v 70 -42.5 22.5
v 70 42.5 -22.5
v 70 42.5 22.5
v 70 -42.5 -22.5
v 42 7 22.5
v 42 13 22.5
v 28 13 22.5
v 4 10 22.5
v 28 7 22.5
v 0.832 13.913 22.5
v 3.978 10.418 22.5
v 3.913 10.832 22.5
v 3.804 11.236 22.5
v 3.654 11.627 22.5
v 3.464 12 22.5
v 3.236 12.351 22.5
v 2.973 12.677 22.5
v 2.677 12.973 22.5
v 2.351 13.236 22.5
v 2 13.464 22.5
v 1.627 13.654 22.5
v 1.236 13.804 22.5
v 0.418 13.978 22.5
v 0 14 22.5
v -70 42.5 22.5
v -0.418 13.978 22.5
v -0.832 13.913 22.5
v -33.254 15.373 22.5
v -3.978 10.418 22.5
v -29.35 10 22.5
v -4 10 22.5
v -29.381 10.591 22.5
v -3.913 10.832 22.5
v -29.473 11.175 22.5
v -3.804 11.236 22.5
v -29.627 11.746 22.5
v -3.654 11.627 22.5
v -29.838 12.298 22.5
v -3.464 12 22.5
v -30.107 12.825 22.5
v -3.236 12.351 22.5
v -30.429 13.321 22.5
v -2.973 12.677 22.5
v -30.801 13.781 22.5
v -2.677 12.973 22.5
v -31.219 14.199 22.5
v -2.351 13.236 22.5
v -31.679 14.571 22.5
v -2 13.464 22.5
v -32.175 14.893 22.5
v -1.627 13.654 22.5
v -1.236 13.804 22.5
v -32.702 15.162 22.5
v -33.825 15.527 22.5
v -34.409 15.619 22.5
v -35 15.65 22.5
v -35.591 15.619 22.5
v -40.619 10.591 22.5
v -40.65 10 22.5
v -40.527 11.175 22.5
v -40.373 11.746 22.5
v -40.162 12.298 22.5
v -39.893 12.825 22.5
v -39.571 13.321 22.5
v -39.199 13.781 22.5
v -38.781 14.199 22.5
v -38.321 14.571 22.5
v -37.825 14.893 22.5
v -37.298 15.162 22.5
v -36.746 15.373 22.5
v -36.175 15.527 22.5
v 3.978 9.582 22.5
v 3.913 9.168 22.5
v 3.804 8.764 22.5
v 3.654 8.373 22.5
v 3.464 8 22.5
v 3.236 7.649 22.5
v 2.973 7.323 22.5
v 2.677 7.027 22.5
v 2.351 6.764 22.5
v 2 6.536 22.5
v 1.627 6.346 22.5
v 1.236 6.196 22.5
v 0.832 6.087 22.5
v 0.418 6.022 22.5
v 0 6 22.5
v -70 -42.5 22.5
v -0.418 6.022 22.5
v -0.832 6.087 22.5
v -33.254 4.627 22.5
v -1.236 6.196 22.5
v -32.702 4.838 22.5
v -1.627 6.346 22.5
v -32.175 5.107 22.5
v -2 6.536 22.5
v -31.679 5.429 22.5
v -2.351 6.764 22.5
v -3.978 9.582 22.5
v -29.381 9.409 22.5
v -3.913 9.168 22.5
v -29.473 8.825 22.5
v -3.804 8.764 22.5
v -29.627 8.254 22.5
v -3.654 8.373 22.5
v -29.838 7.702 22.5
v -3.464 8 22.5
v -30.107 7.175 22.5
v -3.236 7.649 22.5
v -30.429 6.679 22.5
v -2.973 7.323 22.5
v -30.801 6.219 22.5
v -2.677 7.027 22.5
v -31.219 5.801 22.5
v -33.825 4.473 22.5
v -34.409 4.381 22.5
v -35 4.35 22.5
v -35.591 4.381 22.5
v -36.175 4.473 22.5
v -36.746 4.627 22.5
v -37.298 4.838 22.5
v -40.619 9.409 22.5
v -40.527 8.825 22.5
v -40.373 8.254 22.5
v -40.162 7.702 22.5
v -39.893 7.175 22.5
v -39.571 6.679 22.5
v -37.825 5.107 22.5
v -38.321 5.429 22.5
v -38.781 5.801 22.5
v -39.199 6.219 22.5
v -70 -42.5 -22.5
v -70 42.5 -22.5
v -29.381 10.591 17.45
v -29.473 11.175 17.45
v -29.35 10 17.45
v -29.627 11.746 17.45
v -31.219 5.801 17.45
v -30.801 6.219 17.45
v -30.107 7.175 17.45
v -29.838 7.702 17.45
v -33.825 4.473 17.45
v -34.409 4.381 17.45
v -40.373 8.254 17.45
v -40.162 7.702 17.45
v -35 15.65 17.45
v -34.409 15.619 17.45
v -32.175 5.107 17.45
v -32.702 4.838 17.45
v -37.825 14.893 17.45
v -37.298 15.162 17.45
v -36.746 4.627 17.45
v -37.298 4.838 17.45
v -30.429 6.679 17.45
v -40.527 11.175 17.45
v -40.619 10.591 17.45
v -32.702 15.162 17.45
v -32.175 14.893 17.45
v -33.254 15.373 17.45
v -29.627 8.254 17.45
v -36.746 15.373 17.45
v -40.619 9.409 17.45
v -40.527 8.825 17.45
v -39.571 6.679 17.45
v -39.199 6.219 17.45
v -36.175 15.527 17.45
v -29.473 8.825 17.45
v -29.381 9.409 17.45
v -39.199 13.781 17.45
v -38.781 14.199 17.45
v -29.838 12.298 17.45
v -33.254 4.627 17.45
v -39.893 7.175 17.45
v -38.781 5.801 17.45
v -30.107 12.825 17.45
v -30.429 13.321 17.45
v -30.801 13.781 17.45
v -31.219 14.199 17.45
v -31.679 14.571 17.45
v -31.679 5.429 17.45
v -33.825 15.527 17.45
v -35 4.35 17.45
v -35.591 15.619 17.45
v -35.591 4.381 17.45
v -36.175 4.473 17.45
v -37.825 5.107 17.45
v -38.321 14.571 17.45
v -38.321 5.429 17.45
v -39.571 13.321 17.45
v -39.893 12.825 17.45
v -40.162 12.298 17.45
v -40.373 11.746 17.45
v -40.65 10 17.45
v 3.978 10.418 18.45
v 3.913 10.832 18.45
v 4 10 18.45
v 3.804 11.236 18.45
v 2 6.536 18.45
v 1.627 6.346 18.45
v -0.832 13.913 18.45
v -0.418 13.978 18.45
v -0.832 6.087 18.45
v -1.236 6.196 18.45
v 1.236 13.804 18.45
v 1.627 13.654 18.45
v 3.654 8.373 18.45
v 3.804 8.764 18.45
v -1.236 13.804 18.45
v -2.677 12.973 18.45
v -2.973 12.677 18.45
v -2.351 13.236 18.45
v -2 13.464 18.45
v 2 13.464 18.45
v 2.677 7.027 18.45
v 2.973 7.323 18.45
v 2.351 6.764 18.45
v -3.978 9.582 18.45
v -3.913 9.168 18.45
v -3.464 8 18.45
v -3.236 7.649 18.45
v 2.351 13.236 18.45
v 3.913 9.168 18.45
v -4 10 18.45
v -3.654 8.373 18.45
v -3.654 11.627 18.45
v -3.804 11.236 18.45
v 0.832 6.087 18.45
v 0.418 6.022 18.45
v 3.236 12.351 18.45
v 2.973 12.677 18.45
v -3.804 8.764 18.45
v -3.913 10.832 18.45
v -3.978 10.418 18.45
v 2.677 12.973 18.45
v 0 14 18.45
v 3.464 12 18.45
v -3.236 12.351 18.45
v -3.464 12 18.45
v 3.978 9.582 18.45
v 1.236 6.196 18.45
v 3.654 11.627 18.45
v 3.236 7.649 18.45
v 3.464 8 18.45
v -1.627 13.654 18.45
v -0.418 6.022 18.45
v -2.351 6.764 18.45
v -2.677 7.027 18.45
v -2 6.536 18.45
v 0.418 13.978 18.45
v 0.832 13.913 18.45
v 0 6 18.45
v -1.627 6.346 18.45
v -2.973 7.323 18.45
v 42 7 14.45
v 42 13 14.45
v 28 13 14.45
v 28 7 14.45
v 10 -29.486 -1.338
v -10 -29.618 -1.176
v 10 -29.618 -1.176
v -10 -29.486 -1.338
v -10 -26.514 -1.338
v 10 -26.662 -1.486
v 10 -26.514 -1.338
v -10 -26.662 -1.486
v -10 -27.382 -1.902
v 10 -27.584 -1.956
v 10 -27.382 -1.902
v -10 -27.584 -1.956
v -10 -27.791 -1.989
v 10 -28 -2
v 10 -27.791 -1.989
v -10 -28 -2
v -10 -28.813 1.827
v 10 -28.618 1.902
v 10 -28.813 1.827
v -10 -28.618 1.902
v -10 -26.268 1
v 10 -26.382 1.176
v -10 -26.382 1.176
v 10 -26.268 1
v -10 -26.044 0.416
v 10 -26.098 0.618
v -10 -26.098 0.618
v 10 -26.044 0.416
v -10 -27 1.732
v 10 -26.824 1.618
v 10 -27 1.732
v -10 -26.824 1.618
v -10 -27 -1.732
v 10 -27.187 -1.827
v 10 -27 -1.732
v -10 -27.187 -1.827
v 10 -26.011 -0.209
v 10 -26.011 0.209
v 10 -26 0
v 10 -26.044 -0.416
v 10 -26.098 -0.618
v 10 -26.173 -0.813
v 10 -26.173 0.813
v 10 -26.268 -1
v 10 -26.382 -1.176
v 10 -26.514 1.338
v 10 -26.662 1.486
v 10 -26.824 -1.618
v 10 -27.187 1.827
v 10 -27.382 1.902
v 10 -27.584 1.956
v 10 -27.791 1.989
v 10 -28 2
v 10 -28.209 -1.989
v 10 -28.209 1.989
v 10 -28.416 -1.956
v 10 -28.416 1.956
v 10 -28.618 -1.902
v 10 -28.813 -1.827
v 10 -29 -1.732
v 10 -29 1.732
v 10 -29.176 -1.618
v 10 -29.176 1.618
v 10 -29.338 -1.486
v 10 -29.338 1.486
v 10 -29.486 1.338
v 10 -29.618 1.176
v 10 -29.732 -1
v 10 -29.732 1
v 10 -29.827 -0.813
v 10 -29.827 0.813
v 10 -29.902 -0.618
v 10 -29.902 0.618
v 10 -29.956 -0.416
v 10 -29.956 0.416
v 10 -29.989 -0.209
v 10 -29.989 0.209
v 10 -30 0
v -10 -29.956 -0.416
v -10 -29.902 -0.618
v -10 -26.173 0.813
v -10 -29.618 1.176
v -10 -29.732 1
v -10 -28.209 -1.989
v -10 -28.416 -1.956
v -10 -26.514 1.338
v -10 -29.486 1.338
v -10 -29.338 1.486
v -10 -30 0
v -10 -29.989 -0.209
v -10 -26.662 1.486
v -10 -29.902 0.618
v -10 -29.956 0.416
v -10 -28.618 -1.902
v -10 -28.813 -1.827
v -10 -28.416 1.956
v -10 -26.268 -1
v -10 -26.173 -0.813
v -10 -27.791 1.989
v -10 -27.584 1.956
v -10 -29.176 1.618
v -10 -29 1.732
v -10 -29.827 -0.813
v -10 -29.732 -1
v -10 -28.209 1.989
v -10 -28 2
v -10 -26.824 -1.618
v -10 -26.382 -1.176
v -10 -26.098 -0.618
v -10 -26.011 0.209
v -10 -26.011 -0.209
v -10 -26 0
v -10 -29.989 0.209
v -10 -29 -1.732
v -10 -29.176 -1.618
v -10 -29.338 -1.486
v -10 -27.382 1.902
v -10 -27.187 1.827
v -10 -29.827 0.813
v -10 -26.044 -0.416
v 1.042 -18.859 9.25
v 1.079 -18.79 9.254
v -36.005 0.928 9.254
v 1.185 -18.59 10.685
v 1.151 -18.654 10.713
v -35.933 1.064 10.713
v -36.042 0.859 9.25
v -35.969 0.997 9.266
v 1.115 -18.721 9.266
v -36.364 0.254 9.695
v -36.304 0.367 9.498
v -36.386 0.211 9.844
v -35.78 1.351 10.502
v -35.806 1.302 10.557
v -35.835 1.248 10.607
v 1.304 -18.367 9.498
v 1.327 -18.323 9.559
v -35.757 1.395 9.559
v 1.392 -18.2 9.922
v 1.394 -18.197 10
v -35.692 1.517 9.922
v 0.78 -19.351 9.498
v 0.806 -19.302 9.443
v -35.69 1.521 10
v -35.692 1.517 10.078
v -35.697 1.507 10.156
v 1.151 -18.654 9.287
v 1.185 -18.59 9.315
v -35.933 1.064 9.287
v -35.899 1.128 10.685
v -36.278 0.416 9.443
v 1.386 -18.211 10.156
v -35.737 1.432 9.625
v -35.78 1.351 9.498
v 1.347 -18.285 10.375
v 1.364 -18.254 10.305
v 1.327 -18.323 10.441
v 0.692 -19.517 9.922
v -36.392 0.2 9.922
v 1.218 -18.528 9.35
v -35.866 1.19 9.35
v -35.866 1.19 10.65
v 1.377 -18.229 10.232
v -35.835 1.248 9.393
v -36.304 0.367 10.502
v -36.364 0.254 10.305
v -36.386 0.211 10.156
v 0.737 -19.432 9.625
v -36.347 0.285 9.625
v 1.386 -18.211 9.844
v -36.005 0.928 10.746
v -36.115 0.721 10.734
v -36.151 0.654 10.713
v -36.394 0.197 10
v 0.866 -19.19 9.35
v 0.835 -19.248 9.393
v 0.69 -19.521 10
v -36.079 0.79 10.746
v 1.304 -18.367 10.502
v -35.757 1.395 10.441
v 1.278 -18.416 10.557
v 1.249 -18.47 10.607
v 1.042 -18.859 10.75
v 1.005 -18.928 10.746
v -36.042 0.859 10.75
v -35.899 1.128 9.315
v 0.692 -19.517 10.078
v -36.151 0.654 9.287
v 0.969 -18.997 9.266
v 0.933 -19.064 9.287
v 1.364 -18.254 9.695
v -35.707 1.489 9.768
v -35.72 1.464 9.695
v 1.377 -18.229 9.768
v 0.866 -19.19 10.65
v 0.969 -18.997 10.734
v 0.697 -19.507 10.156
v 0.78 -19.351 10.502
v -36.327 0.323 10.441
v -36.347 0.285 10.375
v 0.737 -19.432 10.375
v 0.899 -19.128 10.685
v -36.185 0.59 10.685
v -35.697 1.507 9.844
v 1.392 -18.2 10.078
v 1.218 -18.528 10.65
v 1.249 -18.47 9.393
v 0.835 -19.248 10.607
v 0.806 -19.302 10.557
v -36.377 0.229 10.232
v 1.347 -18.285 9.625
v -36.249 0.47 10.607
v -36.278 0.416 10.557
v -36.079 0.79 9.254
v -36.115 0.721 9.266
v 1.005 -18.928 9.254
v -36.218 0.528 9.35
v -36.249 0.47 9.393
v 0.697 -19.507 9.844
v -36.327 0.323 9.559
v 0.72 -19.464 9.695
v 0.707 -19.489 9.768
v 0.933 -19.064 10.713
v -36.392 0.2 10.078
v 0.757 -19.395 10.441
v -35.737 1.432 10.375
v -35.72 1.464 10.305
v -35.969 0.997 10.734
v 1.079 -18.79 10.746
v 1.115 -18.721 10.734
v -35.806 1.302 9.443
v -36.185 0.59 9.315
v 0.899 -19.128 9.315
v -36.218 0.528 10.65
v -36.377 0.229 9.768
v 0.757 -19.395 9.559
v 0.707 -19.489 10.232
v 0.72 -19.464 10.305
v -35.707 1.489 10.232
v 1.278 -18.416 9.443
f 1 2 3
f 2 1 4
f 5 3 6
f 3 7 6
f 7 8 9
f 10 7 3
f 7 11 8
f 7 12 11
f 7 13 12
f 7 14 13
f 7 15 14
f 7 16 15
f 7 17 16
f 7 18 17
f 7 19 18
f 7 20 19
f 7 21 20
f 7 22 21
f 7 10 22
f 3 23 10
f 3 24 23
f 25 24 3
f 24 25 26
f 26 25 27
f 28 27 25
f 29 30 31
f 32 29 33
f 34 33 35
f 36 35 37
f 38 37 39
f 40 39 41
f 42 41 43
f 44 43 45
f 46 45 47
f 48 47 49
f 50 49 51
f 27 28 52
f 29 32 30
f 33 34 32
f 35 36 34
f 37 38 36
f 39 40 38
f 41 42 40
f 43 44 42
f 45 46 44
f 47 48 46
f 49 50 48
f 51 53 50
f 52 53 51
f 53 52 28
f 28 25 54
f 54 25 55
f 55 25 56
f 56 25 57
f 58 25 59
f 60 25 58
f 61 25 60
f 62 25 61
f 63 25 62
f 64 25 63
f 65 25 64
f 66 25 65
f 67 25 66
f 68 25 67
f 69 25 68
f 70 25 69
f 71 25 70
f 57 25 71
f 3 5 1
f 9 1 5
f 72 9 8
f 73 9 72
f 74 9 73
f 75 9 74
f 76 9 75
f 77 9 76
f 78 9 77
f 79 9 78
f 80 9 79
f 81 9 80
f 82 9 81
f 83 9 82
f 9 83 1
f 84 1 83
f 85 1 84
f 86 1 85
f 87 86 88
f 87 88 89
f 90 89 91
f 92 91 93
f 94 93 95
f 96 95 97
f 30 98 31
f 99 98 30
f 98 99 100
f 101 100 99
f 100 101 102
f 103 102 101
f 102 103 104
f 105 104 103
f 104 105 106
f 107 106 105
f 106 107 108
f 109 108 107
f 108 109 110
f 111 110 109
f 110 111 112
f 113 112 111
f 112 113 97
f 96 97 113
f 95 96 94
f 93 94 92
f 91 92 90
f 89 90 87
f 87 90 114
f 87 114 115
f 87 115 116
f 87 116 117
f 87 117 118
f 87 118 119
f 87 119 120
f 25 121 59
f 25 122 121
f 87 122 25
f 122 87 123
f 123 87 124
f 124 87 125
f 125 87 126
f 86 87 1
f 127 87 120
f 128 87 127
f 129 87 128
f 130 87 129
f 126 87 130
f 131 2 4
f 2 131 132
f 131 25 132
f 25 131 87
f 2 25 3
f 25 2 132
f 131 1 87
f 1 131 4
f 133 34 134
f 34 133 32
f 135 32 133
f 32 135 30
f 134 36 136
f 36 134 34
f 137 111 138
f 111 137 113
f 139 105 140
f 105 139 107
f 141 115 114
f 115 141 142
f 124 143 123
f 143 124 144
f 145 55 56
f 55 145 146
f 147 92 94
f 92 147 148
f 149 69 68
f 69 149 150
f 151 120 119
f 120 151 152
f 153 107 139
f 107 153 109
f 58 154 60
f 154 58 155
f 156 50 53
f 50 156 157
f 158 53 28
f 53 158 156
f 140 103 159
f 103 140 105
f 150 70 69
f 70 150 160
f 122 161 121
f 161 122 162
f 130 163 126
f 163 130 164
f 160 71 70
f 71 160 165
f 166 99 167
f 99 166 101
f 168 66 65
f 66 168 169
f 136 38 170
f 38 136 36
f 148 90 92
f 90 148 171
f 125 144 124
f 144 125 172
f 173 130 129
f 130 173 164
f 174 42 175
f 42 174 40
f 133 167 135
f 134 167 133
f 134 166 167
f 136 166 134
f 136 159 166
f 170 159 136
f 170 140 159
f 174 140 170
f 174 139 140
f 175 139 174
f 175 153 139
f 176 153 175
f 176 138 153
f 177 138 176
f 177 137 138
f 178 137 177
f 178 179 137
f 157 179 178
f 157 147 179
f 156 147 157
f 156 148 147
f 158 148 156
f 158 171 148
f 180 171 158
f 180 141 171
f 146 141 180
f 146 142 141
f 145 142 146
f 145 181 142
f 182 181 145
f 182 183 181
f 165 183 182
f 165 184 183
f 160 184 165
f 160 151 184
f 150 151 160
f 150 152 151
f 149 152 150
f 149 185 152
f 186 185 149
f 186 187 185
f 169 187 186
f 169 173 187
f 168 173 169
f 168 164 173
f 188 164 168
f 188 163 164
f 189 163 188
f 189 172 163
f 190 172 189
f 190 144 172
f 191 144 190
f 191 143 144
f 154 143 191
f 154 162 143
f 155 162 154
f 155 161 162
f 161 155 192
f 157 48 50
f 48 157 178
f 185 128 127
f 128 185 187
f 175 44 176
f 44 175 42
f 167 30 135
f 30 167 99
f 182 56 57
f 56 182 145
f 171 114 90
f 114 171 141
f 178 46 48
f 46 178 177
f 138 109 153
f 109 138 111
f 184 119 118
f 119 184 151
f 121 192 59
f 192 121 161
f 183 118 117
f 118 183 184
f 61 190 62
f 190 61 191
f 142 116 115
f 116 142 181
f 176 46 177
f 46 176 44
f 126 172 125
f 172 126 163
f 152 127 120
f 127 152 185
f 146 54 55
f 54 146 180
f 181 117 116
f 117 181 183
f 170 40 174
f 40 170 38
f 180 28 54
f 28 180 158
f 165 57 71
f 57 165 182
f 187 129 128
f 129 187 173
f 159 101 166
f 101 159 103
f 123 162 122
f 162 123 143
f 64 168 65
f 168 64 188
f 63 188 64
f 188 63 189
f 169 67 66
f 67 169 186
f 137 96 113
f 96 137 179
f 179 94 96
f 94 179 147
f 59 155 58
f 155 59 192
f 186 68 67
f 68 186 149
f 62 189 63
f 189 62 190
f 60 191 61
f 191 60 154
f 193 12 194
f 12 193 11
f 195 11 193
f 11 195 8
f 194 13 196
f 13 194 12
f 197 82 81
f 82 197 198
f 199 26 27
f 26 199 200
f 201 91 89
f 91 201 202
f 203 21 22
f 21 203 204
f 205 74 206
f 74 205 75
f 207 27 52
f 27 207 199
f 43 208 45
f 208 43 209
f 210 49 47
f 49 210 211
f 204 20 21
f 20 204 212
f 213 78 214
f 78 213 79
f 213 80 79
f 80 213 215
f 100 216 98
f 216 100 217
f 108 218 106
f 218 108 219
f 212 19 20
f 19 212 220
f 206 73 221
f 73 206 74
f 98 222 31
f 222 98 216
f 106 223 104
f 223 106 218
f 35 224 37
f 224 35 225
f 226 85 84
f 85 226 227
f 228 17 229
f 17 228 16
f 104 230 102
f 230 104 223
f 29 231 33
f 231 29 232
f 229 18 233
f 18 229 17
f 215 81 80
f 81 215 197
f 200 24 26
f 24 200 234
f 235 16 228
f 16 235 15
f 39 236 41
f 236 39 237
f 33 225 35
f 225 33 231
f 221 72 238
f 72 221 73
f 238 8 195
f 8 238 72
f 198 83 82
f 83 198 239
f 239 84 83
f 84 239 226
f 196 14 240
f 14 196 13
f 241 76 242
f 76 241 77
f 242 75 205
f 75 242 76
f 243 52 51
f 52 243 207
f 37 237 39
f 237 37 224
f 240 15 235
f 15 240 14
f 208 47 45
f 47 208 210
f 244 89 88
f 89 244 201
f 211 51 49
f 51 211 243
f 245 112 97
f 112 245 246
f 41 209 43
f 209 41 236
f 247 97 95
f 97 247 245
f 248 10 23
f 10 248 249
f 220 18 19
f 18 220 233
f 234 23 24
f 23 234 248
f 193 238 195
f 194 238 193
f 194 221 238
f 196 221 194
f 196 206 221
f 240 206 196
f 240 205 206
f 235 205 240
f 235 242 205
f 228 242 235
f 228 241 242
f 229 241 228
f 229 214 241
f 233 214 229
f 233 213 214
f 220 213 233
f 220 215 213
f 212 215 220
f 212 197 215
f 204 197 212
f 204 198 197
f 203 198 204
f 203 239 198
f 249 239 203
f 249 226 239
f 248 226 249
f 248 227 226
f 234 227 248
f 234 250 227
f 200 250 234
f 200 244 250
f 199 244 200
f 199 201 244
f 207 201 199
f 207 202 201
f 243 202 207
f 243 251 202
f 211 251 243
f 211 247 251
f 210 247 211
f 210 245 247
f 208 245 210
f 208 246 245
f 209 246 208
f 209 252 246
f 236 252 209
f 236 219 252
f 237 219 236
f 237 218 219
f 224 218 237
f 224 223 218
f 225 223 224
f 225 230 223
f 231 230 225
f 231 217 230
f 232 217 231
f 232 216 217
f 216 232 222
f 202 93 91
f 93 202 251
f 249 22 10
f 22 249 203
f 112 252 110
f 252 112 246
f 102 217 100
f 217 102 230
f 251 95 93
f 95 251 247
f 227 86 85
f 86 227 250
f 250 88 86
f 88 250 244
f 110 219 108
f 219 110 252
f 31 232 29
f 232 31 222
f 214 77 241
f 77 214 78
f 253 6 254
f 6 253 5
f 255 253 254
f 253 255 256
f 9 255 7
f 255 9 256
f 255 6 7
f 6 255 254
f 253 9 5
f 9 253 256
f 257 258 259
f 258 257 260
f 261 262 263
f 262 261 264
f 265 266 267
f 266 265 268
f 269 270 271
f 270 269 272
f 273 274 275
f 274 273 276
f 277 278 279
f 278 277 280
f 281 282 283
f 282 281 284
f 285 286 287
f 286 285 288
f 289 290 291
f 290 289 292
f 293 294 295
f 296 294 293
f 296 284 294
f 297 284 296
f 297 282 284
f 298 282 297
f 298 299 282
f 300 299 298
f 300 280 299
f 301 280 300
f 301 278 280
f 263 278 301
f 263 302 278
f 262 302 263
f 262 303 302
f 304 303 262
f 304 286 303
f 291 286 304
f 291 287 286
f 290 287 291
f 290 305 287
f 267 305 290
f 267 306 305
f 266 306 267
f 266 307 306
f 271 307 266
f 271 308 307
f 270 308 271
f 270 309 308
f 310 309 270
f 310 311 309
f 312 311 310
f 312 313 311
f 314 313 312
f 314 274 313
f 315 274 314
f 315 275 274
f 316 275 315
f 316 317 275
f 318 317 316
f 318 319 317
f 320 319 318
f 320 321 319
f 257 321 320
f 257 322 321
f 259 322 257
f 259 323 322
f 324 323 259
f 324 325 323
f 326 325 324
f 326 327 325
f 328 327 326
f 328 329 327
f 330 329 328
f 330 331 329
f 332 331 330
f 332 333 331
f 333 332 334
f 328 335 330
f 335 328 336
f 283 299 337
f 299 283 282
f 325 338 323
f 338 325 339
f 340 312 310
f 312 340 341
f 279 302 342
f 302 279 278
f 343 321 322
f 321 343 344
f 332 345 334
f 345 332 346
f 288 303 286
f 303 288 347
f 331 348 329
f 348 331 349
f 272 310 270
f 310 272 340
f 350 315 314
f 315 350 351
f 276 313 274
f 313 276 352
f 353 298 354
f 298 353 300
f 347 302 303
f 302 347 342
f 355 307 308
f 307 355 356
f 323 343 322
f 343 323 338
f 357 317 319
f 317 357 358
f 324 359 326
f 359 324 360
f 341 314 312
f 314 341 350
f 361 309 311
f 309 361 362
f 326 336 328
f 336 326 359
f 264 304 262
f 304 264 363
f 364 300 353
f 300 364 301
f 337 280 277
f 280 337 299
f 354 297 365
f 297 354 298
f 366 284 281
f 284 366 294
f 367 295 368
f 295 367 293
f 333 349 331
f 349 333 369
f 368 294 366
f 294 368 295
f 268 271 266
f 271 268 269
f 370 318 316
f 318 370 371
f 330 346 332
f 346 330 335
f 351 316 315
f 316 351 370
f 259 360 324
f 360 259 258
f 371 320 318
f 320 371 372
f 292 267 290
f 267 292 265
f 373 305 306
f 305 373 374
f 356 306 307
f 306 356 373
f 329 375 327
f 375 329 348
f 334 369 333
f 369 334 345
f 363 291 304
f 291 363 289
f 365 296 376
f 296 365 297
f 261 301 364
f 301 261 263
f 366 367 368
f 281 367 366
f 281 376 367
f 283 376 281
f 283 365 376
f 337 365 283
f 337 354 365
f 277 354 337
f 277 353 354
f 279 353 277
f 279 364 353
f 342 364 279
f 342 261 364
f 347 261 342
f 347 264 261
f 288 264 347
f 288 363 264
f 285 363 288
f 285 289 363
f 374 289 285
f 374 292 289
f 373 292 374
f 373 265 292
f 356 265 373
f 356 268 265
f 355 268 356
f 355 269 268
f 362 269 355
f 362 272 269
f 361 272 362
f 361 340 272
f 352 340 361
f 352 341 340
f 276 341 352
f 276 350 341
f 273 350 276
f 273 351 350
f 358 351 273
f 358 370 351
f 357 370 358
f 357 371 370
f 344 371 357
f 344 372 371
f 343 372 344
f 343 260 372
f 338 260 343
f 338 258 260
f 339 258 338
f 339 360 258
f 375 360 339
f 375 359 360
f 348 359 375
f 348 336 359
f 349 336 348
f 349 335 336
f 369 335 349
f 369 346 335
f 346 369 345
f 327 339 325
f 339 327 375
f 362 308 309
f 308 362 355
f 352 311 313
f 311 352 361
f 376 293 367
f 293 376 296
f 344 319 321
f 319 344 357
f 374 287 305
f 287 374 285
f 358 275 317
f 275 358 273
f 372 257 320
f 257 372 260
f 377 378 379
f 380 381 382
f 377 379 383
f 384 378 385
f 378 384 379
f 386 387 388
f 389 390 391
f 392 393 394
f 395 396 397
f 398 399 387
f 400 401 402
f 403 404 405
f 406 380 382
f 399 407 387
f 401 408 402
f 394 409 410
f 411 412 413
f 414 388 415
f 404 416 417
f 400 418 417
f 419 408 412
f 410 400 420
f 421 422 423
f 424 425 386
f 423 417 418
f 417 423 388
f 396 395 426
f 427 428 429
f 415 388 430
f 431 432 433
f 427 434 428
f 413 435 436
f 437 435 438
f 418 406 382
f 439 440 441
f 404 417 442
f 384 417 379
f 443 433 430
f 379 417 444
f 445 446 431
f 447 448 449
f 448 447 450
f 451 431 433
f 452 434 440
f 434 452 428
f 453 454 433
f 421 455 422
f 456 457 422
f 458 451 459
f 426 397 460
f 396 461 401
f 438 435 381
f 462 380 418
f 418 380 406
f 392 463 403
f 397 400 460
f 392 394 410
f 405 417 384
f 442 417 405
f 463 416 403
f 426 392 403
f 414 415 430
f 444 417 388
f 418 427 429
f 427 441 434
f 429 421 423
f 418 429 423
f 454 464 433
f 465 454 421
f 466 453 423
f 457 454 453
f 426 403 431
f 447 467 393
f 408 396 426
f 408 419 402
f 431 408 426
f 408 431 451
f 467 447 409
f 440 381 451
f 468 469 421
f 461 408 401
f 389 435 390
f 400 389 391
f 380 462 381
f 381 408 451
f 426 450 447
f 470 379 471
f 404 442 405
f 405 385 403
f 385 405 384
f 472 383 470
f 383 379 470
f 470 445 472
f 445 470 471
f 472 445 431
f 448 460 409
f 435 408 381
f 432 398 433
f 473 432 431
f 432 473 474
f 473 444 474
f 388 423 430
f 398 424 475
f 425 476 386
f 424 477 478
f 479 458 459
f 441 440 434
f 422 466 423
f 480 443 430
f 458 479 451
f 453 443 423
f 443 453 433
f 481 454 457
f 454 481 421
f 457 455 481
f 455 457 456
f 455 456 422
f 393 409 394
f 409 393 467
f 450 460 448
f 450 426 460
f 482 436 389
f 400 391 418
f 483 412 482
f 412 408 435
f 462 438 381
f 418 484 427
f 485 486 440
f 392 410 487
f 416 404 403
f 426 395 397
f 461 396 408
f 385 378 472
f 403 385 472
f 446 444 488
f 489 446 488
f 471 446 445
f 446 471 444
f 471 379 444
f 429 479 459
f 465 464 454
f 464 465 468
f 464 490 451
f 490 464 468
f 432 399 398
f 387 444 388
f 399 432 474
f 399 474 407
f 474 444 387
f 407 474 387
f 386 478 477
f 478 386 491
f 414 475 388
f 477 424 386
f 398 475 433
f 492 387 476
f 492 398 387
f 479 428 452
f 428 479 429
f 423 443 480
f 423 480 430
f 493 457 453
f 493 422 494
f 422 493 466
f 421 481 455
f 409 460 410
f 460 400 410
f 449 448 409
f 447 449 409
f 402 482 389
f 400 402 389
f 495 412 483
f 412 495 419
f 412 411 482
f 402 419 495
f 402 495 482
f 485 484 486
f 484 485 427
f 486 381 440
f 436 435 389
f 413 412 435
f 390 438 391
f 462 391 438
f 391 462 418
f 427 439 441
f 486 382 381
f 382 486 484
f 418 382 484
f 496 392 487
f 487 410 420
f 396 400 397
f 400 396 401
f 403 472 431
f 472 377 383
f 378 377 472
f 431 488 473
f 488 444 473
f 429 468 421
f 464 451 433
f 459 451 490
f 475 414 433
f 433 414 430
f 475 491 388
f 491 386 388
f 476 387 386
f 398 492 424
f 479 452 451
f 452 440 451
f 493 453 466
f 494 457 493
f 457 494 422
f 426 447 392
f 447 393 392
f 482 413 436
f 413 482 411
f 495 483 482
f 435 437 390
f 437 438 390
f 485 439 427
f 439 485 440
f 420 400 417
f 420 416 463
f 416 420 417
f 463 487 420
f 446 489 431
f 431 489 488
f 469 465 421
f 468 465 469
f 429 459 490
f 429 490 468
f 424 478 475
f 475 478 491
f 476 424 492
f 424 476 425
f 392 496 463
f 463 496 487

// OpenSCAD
// ====================================================================
// 3-WAY HERMETIC HELIUM MONOLITHIC CHASSIS & COMPRESSOR ASSEMBLY
// OpenSCAD Parametric Script for CAD Export (.STEP / .STL)
// ====================================================================

$fn = 60;

chassis_length = 140.0;
chassis_width  = 85.0;
chassis_height = 45.0;

module monolithic_chassis() {
    difference() {
        cube([chassis_length, chassis_width, chassis_height], center=true);

        // Bass Chamber (500 mm³)
        translate([-35, 10, chassis_height/2 - 2.5])
            cylinder(h=5.1, d=11.3, center=true);

        // Mid Chamber (200 mm³)
        translate([0, 10, chassis_height/2 - 2.0])
            cylinder(h=4.1, d=8.0, center=true);

        // Treble Dry Slot
        translate([35, 10, chassis_height/2 - 4.0])
            cube([14.0, 6.0, 8.1], center=true);

        // Cycle Compressor Piston Bore
        translate([0, -28, 0])
            rotate([0, 90, 0])
                cylinder(h=20.0, d=4.0, center=true);

        // Internal Helium Manifolds (1.5mm)
        translate([-17.5, -9, 10])
            rotate([0, 90, -28])
                cylinder(h=42, d=1.5, center=true);
    }
}

monolithic_chassis();
